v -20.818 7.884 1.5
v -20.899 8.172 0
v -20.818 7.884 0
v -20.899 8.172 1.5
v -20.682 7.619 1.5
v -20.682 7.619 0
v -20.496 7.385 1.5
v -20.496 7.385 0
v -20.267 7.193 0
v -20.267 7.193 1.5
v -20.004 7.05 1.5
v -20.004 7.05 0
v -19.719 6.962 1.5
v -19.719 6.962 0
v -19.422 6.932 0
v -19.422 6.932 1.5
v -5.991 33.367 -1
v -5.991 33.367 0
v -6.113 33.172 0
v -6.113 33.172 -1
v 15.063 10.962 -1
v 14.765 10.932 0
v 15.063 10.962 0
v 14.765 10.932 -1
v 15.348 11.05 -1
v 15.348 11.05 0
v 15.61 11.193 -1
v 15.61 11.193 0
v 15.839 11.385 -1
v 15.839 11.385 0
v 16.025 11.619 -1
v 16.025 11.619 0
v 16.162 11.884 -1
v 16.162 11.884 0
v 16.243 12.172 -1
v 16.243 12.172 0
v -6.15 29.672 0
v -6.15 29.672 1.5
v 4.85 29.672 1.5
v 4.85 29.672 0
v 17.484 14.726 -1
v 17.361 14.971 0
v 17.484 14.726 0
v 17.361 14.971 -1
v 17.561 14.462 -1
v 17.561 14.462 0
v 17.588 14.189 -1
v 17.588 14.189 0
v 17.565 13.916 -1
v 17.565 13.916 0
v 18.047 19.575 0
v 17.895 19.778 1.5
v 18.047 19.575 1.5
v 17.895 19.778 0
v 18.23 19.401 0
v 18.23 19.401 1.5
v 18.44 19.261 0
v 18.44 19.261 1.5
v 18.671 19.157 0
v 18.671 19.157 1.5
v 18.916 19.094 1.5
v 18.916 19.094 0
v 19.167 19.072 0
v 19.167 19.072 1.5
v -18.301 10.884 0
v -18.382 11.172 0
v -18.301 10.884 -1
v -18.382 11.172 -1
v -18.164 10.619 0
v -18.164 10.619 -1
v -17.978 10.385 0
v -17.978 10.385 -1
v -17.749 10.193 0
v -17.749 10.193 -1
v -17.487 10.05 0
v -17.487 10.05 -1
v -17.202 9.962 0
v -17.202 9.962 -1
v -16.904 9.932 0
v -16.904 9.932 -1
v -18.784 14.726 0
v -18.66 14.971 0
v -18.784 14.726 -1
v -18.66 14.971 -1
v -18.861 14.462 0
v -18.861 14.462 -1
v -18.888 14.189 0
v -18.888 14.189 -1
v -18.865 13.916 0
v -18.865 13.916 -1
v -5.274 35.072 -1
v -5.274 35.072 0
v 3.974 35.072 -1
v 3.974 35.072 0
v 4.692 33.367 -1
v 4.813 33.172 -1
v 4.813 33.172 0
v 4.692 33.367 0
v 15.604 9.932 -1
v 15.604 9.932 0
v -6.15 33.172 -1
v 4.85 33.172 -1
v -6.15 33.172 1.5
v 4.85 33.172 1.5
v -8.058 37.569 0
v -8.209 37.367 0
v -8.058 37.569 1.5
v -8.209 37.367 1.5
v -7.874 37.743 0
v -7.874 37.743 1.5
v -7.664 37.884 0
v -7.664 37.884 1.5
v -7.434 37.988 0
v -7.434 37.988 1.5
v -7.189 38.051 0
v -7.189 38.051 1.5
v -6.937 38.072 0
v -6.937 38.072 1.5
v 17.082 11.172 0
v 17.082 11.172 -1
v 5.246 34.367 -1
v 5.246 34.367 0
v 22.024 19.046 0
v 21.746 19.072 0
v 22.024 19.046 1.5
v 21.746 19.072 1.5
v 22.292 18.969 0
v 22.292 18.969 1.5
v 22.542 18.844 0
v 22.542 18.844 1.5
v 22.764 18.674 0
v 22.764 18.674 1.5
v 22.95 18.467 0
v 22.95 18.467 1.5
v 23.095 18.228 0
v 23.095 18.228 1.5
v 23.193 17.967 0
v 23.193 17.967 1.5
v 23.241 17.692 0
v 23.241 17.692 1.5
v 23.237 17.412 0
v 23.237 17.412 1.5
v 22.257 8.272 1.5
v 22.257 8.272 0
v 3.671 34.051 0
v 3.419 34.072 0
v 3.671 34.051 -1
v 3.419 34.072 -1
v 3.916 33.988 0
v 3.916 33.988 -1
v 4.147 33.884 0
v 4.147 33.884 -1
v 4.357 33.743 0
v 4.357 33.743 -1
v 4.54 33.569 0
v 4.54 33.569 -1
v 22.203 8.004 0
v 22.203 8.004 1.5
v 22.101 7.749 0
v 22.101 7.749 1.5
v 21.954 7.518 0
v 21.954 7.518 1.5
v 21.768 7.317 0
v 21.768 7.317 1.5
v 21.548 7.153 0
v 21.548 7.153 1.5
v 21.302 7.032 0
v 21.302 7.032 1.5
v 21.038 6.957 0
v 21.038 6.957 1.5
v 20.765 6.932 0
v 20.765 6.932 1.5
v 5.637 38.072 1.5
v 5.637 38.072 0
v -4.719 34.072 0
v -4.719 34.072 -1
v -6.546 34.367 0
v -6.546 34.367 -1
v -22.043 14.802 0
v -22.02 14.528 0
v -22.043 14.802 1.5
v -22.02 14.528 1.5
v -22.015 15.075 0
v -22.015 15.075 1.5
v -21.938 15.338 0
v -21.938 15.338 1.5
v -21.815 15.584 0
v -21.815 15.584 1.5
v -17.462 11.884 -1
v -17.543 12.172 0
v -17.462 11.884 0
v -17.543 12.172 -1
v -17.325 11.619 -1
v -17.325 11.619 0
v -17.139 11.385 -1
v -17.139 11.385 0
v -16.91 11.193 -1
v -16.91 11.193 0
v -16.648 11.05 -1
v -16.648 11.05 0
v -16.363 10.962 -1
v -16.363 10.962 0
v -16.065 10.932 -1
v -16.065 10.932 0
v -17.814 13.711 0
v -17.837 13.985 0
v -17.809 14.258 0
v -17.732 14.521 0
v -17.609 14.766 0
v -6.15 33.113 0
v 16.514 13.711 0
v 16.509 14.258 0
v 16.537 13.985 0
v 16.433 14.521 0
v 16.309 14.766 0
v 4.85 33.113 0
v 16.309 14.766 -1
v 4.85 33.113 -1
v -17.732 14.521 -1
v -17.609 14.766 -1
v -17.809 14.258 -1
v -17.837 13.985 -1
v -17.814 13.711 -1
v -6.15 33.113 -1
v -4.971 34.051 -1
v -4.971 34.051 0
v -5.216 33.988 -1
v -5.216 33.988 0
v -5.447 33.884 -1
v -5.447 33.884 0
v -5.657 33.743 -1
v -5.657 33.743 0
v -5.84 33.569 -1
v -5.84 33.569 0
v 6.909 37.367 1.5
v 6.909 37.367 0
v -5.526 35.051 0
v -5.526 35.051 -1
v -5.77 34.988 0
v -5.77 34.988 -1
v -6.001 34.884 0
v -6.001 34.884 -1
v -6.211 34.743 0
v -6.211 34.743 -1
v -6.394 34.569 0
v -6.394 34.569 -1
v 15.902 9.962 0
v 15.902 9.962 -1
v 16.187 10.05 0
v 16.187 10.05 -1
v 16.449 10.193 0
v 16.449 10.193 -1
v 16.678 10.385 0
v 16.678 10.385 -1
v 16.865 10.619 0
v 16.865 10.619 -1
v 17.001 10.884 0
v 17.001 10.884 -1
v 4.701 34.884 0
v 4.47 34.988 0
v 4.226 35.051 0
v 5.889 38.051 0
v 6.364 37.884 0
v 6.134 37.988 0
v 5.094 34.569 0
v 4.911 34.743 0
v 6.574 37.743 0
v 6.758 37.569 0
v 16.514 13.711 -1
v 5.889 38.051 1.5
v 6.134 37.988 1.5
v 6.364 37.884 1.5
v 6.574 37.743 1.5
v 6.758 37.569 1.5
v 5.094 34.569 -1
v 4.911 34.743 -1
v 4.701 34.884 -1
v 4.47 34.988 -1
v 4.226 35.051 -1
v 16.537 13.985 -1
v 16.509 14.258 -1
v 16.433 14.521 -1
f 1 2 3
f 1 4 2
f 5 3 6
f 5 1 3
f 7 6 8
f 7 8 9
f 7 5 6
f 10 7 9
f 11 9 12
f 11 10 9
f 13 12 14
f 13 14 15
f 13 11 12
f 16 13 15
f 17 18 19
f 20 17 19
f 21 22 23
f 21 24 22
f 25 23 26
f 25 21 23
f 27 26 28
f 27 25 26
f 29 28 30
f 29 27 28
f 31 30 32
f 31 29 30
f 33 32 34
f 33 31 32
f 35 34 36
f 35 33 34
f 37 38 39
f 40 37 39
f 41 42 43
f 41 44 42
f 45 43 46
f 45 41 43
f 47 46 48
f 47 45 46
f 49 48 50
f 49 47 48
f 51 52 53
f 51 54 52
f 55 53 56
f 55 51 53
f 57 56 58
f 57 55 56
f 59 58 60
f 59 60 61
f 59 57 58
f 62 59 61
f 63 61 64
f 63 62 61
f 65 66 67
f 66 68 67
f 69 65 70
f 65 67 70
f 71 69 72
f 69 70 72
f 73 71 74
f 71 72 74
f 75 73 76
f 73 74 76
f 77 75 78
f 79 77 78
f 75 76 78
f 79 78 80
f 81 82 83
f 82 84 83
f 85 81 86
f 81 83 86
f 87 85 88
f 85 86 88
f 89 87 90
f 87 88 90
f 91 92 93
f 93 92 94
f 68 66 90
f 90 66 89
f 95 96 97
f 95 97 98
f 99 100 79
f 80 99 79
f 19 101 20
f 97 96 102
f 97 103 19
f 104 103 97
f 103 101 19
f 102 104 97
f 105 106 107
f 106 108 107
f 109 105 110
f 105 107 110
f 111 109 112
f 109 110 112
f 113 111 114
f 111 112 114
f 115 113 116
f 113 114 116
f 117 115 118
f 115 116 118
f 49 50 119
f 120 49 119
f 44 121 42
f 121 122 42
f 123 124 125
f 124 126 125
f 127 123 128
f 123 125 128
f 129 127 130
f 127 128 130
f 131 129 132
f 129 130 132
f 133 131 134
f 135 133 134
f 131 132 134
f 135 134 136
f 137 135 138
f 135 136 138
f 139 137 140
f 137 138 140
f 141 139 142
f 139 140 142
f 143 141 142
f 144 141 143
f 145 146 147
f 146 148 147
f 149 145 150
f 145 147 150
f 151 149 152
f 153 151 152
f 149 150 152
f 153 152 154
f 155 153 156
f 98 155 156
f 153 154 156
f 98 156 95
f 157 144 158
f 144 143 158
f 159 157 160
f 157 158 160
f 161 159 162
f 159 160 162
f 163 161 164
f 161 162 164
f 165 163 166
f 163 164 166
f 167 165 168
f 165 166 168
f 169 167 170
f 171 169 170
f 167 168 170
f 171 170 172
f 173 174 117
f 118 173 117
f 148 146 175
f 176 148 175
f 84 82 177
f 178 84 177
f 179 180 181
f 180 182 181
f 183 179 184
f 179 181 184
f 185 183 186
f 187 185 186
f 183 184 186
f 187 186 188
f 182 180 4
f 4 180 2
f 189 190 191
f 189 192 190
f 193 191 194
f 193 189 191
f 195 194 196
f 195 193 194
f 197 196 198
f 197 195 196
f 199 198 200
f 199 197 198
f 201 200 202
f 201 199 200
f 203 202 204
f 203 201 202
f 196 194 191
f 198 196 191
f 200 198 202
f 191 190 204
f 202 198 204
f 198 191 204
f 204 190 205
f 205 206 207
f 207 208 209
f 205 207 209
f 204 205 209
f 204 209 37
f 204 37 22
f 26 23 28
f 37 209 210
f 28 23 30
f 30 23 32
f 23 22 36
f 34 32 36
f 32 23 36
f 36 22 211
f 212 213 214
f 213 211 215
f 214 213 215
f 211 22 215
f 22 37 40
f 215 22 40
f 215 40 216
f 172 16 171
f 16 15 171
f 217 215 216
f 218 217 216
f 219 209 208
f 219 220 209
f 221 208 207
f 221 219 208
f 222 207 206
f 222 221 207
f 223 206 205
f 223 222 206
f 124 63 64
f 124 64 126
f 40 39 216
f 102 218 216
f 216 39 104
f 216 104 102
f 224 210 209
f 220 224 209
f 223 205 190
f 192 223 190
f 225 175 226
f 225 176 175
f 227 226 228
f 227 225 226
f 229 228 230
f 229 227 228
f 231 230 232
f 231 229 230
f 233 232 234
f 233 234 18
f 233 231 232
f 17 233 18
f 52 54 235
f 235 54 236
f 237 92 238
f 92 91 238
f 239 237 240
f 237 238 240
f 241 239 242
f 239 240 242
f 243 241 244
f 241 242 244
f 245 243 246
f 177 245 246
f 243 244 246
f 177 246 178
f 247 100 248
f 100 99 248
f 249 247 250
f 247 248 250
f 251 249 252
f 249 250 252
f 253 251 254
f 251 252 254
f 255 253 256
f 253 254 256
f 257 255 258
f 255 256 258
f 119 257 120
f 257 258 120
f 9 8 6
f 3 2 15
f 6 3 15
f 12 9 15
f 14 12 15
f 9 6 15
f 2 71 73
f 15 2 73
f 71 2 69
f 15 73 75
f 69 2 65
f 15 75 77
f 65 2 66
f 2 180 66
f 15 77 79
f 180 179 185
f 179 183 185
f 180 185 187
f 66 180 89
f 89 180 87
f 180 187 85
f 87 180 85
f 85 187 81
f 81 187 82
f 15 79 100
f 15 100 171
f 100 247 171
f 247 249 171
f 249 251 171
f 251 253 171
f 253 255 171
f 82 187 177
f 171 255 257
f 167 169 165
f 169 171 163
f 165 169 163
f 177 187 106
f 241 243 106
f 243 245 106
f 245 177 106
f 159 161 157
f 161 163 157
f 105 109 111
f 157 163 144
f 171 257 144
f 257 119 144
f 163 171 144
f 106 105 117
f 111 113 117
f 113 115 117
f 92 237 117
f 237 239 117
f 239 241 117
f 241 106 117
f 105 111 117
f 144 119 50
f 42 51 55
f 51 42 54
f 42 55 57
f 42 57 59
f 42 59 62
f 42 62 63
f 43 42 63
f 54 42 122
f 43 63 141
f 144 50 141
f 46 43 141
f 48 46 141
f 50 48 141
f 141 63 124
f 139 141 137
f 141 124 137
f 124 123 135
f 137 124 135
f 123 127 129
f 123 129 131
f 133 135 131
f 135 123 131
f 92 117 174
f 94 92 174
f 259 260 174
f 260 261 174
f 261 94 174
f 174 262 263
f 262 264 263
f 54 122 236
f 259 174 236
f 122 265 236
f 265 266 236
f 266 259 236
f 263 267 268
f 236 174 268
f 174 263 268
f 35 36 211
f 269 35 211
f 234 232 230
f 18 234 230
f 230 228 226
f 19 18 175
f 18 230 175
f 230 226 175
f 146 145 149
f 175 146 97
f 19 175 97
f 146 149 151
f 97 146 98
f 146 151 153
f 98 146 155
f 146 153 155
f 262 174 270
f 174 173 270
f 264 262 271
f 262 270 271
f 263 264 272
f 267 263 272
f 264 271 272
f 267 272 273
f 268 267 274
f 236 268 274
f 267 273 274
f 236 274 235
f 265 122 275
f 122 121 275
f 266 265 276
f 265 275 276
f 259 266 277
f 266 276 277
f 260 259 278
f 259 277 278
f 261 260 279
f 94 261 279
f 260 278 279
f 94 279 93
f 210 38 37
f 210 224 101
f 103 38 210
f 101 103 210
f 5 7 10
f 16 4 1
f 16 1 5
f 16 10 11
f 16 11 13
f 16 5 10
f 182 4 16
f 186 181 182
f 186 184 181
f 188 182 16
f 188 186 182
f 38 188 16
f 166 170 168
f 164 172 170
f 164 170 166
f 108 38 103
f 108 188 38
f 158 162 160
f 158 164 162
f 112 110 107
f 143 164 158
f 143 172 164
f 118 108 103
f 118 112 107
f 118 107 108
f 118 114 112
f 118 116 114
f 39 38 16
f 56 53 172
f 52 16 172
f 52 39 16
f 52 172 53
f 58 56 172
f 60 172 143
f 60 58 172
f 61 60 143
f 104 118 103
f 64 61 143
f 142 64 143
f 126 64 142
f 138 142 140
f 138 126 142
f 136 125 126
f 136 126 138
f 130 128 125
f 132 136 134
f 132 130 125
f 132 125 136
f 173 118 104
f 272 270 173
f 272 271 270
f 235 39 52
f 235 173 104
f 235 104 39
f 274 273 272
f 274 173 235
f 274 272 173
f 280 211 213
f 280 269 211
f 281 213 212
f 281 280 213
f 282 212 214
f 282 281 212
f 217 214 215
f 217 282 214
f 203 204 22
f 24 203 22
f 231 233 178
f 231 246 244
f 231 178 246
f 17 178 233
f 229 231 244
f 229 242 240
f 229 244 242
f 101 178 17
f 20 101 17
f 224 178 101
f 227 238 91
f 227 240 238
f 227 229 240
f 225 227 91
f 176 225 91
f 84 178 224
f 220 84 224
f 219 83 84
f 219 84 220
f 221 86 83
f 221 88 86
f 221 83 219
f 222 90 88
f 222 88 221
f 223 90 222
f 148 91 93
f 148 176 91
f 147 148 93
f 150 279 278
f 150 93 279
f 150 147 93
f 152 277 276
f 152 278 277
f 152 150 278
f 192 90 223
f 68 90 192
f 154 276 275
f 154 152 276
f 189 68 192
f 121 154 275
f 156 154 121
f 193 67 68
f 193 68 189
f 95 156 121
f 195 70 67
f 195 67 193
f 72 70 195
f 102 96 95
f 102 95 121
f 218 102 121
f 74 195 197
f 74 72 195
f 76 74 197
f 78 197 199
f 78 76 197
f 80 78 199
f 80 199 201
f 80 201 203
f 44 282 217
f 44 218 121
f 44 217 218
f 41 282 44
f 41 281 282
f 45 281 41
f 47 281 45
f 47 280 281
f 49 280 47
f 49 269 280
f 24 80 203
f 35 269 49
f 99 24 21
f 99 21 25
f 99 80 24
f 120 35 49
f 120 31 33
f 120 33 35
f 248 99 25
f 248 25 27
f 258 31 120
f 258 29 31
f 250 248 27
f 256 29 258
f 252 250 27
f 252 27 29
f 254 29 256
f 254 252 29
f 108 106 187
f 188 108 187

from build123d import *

# Parameters (mm, degrees)
F1_DEPTH = 1.5
F3_DEPTH = 1
F5_DEPTH = 1.5
F6_R     = 1.5
F7_W     = 11
F7_H     = 3.5
F8_DEPTH = 25


with BuildPart() as f1:
    # F0 (on Top) → F1 (new body)
    with BuildSketch(Plane.XY):
        Polygon((6.468732, 38.072392), (-7.768678, 38.072392), (-22.119725, 15.095294), (-20.680386, 6.932392), (19.38044, 6.932392), (20.81978, 15.095294), align=None)
    extrude(amount=F1_DEPTH)

    # F2 (on face) → F3 (join)
    with BuildSketch(Plane(origin=(0, 0, 0), x_dir=(1, 0, 0), z_dir=(0, 0, -1))):
        Polygon((-18.163087, -9.932392), (-18.965392, -14.482494), (-6.105343, -35.072392), (4.805398, -35.072392), (17.665447, -14.482494), (16.863141, -9.932392), align=None)
        Polygon((4.250953, -34.072392), (-5.550899, -34.072392), (-17.913948, -14.278227), (-17.323987, -10.932392), (16.024041, -10.932392), (16.614002, -14.278227), align=None, mode=Mode.SUBTRACT)
    extrude(amount=F3_DEPTH)

    # F4 (on face) → F5 (join)
    with BuildSketch(Plane(origin=(0, 0, 0), x_dir=(1, 0, 0), z_dir=(0, 0, -1))):
        Polygon((16.863141, -6.932392), (16.863141, -9.932392), (16.586395, -19.072392), (23.415447, -19.072392), (22.113141, -6.932392), align=None)
    extrude(amount=-F5_DEPTH)

    # F6
    f6_edges = [f1.edges().sort_by_distance(p)[0] for p in [
        (23.415447, 19.072392, 0.75),
        (18.335762, 19.072392, 0.75),
        (22.113141, 6.932392, 0.75),
        (-20.680386, 6.932392, 0.75),
        (-22.119725, 15.095294, 0.75),
        (-7.768678, 38.072392, 0.75),
        (6.468732, 38.072392, 0.75),
        (4.805398, 35.072392, -0.5),
        (-6.105343, 35.072392, -0.5),
        (-18.965392, 14.482494, -0.5),
        (-18.163087, 9.932392, -0.5),
        (16.863141, 9.932392, -0.5),
        (17.665447, 14.482494, -0.5),
        (-17.323987, 10.932392, -0.5),
        (-17.913948, 14.278227, -0.5),
        (-5.550899, 34.072392, -0.5),
        (4.250953, 34.072392, -0.5),
        (16.024041, 10.932392, -0.5),
        (16.614002, 14.278227, -0.5),
    ]]
    fillet(f6_edges, radius=F6_R)

    # F7 (on face) → F8 (cut)
    with BuildSketch(Plane.XY.offset(1.5)):
        with Locations((-0.649973, 31.422392)):
            Rectangle(F7_W, F7_H)
    extrude(amount=-F8_DEPTH, mode=Mode.SUBTRACT)


solid = f1.part
